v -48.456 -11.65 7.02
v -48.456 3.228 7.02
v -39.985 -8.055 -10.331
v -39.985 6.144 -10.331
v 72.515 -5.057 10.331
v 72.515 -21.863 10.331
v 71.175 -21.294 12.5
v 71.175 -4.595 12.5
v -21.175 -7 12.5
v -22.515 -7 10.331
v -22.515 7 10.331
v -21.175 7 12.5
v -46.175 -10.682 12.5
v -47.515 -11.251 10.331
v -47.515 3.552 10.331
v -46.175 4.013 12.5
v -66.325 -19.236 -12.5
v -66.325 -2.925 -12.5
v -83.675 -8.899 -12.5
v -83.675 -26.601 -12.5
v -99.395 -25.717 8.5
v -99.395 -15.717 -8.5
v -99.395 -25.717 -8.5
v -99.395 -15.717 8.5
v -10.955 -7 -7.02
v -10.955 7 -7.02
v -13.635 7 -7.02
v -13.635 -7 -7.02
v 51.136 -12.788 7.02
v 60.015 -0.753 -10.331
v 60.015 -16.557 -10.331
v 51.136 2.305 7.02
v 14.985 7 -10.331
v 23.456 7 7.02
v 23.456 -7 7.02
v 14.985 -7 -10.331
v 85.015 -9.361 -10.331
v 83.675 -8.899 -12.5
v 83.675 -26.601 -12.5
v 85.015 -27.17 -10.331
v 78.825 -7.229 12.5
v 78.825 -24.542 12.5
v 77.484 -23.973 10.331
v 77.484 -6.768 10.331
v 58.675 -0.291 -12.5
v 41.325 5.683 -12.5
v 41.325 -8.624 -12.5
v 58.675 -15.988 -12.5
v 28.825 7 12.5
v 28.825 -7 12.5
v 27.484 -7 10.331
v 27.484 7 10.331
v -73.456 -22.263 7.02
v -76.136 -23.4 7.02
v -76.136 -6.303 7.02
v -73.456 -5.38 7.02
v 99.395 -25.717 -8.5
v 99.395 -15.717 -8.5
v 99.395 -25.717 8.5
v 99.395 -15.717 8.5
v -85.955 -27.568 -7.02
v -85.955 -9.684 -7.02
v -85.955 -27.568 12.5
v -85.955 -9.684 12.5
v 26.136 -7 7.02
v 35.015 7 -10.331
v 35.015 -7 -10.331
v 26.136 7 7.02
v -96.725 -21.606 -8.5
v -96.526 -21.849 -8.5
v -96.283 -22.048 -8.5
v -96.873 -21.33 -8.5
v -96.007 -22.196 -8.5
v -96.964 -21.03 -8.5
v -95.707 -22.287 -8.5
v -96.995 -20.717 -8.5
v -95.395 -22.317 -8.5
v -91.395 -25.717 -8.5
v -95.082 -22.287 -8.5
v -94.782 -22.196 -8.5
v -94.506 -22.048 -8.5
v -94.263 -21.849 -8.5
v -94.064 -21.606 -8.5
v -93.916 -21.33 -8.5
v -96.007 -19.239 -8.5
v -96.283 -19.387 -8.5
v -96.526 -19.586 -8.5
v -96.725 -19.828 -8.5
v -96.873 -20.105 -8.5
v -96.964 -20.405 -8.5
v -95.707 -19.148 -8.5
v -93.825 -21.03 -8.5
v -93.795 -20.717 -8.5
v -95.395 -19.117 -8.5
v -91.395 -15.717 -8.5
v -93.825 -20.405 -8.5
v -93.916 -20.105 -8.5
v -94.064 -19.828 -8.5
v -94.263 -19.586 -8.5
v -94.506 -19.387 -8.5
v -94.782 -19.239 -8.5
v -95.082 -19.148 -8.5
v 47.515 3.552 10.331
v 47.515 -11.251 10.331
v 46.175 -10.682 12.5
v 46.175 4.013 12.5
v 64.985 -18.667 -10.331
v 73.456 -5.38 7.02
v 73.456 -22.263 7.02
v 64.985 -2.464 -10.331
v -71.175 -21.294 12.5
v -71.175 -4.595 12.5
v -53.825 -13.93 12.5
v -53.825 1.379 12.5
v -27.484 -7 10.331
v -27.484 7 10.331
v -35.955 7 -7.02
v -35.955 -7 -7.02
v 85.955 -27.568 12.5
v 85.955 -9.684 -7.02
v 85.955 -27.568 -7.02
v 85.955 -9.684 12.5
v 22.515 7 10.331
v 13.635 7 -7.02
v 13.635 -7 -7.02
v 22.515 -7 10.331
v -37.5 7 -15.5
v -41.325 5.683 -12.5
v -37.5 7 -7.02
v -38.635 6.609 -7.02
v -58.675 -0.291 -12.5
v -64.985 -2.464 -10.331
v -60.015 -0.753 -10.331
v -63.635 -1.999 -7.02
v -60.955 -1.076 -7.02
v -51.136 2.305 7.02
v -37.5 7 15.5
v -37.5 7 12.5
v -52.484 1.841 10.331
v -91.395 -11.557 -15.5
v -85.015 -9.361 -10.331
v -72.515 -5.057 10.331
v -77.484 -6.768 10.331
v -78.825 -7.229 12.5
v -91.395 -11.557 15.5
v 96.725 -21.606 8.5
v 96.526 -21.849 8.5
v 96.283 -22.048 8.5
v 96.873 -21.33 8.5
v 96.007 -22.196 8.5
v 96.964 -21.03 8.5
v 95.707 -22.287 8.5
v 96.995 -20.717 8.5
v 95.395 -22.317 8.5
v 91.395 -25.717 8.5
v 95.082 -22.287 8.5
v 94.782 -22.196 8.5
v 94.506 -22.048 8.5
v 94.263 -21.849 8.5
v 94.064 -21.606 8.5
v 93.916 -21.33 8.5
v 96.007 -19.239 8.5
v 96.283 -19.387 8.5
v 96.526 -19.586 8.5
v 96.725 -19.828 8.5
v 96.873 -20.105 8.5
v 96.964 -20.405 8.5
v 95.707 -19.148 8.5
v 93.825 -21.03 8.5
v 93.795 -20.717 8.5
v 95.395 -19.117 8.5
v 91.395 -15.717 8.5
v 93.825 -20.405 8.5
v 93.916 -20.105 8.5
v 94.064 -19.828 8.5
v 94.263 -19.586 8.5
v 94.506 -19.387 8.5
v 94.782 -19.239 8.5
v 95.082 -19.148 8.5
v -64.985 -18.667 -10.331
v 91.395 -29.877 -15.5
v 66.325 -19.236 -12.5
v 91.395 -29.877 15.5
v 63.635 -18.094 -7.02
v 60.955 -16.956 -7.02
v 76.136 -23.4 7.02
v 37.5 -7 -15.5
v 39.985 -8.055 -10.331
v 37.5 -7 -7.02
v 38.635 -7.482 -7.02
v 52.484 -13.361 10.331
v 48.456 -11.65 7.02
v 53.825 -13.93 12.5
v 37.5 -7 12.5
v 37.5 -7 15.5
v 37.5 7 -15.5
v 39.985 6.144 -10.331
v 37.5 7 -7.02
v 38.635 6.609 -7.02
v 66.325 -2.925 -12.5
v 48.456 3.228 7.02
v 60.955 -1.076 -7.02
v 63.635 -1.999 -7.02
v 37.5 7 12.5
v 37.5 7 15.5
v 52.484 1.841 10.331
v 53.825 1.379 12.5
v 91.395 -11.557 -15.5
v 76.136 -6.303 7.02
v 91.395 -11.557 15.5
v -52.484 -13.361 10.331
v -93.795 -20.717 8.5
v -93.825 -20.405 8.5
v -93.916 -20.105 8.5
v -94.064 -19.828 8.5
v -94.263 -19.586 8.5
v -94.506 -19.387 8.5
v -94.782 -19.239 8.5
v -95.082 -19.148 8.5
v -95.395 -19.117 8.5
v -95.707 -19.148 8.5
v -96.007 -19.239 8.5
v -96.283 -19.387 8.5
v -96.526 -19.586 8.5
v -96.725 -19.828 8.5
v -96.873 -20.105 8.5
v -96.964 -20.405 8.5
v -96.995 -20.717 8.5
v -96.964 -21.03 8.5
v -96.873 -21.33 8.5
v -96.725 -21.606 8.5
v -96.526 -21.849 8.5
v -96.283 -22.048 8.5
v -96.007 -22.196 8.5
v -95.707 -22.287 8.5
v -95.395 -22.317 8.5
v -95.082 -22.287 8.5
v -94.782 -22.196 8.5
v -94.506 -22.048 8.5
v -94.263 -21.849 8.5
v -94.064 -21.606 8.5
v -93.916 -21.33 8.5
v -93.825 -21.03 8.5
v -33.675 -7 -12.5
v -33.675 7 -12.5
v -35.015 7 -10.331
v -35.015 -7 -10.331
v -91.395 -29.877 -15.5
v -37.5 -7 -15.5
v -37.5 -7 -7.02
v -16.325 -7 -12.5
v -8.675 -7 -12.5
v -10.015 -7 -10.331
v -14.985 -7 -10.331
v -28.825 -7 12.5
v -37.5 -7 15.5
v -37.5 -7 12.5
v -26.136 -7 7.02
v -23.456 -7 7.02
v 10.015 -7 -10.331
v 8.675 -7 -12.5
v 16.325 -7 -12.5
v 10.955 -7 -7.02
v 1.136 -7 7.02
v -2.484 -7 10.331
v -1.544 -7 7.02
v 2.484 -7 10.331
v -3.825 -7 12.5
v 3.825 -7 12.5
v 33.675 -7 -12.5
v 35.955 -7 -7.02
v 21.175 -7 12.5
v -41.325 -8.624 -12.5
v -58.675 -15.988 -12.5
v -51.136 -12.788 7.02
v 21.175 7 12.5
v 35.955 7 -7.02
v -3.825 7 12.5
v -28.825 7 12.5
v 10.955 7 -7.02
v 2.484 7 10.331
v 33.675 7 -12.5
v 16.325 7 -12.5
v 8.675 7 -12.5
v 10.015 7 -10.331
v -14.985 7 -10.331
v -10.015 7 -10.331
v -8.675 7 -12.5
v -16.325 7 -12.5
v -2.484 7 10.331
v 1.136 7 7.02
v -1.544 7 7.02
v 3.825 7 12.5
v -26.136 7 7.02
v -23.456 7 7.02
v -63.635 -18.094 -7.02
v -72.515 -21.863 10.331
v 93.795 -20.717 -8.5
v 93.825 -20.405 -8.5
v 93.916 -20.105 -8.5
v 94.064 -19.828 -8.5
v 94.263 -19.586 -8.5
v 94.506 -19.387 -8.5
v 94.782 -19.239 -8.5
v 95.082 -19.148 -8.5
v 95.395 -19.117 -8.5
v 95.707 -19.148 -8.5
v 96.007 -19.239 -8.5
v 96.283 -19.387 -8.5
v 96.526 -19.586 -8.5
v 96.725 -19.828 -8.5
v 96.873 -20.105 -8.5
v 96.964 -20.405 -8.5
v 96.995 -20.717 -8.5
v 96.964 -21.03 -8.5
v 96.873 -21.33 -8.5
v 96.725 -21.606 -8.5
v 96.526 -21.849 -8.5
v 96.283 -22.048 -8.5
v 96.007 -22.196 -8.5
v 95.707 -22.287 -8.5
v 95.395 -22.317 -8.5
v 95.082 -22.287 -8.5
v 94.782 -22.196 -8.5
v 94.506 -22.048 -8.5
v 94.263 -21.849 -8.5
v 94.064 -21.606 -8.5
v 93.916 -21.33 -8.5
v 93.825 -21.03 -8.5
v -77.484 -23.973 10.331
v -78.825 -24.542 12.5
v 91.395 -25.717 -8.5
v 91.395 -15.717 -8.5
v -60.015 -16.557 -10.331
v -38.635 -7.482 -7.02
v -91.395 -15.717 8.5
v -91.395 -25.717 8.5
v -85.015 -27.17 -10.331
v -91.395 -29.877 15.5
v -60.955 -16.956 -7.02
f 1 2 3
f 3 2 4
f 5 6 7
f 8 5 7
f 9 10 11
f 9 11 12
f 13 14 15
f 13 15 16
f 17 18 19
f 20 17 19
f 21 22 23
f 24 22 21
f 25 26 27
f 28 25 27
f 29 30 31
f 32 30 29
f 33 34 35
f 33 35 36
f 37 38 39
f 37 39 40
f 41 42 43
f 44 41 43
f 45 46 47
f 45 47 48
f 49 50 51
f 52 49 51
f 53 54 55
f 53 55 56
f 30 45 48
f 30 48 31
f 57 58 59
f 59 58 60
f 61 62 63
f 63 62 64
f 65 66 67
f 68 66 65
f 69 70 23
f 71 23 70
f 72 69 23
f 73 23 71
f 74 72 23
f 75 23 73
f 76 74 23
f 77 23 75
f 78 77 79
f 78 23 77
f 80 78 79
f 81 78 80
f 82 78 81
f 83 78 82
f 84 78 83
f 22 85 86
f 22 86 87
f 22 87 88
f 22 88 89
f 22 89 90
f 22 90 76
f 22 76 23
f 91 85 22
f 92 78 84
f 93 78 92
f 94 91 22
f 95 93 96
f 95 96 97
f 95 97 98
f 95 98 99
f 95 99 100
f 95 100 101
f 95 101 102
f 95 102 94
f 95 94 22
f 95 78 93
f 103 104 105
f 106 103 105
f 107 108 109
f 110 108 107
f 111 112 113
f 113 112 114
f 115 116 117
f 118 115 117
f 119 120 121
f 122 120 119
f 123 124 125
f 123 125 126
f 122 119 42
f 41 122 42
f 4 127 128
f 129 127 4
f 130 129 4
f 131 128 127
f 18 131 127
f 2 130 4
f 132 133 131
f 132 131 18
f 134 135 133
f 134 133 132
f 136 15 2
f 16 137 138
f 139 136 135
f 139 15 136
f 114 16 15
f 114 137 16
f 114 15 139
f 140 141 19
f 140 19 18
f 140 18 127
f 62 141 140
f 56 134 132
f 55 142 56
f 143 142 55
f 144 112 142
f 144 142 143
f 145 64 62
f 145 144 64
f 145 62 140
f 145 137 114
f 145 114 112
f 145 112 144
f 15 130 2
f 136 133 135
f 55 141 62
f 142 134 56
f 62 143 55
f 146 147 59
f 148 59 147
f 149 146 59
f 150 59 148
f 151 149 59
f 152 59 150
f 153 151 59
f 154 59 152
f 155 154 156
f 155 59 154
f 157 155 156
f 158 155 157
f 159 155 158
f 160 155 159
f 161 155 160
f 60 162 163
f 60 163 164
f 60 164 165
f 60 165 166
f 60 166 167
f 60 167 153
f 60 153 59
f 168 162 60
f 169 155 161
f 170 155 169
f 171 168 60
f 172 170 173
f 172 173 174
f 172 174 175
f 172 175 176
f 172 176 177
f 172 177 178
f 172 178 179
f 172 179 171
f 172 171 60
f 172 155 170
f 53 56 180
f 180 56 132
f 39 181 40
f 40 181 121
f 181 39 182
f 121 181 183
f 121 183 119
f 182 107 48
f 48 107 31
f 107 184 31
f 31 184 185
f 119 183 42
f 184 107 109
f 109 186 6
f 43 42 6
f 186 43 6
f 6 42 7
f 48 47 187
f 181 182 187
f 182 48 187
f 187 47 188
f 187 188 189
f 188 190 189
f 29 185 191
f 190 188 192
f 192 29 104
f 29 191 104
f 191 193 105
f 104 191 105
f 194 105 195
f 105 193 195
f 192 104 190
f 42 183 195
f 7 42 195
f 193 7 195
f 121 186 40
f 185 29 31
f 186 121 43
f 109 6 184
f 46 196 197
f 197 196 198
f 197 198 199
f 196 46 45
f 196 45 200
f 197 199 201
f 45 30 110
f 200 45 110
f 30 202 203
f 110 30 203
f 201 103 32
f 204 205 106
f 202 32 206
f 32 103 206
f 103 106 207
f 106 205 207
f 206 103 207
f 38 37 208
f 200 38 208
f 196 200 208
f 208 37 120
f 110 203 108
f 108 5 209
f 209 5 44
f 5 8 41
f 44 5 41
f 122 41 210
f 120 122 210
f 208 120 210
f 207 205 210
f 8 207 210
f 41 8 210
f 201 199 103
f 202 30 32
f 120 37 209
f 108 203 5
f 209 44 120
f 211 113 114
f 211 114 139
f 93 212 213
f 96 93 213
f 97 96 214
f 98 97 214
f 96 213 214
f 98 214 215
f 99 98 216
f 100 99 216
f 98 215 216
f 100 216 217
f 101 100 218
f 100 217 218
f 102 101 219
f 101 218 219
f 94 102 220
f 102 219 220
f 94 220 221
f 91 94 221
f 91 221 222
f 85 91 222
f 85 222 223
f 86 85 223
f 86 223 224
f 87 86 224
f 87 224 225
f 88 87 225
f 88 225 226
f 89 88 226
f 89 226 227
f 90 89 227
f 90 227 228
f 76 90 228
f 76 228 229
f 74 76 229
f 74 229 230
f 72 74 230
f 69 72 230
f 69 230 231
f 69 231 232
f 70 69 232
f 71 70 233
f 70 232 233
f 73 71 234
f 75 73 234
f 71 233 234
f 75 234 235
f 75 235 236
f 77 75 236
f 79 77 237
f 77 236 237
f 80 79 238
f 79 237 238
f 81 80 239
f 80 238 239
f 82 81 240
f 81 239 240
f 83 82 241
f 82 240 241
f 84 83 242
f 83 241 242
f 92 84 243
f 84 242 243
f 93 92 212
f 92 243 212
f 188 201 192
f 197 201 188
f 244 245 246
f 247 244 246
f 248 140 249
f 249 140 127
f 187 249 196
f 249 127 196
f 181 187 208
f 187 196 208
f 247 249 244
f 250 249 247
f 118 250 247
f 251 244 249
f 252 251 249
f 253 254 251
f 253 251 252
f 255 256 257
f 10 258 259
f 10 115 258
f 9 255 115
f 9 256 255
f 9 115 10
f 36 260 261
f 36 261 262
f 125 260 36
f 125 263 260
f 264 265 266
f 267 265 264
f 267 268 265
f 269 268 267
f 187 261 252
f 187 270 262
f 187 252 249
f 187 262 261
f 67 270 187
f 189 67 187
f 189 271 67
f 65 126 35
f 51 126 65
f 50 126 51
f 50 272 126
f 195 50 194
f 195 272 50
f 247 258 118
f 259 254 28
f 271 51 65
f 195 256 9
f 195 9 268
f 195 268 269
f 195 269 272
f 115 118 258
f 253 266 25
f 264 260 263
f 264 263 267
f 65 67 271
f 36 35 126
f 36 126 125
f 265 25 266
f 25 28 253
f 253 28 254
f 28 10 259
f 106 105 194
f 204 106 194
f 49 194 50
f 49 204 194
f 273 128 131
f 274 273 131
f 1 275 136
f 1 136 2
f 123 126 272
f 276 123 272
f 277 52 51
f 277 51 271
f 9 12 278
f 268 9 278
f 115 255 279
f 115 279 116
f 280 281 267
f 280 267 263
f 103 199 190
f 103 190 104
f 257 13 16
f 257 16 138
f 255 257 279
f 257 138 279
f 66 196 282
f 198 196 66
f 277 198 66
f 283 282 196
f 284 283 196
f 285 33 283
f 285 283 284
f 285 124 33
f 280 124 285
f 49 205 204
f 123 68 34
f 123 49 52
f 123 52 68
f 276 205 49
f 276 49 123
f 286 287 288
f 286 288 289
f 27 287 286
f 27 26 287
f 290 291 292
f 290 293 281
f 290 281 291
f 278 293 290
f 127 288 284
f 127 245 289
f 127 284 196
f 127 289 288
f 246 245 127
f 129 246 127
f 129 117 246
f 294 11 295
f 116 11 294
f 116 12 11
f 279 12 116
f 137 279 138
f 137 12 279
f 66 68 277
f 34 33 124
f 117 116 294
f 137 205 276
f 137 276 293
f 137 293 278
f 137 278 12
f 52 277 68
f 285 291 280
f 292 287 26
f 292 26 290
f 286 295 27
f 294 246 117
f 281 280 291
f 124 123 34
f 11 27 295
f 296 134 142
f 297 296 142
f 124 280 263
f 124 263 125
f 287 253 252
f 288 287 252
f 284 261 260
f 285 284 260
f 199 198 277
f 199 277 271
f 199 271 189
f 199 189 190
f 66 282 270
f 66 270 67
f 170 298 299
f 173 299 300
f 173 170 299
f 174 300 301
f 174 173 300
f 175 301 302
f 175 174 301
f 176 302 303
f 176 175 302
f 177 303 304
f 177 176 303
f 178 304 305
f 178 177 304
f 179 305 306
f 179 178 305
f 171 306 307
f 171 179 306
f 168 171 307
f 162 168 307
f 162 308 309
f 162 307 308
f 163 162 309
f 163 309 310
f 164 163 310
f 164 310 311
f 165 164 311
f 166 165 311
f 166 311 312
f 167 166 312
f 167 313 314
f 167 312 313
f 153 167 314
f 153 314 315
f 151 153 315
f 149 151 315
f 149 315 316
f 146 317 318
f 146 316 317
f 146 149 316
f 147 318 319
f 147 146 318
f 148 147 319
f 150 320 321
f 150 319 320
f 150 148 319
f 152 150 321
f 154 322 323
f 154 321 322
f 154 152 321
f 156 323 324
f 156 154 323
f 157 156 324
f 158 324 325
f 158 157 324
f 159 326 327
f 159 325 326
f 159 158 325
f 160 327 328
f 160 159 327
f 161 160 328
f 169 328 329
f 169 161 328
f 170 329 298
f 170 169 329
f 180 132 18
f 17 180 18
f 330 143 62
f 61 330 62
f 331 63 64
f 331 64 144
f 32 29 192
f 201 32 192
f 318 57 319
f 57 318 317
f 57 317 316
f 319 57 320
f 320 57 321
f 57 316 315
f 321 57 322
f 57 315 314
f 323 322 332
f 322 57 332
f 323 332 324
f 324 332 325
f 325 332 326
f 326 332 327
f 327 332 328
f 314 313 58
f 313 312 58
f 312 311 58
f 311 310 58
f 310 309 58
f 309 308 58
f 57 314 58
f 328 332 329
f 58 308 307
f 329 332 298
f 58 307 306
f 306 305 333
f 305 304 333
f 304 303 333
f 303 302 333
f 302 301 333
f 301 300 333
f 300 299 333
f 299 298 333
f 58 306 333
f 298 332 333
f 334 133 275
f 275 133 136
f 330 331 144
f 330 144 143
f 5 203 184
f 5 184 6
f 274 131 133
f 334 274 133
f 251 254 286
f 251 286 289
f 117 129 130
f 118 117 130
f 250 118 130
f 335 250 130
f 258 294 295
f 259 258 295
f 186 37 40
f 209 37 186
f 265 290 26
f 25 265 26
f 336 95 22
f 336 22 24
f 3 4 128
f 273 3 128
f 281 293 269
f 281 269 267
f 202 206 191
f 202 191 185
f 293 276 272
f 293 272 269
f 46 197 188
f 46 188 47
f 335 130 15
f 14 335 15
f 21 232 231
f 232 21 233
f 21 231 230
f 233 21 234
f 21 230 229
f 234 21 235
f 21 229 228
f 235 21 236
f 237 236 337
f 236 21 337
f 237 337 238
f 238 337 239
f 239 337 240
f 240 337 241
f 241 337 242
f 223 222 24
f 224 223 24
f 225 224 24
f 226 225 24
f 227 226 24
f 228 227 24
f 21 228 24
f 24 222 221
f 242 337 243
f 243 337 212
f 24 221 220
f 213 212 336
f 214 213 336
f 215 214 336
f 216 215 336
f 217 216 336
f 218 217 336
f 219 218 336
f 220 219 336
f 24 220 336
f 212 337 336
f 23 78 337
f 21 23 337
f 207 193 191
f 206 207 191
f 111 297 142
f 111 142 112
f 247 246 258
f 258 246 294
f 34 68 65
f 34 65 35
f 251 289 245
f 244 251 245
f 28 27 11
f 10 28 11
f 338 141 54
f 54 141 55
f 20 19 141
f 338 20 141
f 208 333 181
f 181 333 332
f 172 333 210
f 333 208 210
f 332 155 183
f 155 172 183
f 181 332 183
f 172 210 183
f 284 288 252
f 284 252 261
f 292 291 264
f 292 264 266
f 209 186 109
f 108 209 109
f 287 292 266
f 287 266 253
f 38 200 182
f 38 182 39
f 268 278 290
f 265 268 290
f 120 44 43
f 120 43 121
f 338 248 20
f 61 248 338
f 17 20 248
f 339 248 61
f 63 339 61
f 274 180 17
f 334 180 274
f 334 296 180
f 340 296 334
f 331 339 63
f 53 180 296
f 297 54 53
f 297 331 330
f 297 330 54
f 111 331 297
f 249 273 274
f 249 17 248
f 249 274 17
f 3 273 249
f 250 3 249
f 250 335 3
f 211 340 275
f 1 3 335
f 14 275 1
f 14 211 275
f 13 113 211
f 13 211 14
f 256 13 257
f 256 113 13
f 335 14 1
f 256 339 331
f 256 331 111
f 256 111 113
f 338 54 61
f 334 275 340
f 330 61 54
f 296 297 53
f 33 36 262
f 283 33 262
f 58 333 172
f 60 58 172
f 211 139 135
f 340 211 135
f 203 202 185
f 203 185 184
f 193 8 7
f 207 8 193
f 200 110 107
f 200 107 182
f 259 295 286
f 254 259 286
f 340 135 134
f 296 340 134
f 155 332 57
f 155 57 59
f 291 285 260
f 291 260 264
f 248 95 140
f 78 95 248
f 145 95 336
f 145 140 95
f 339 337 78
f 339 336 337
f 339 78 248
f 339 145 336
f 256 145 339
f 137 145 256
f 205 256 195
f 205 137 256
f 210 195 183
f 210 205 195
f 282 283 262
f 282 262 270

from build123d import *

# Parameters (mm, degrees)
CROQUIS1_W              = 37.5
CROQUIS1_H              = 14
SALIENTE_EXTRUIR1_DEPTH = 15.5
CROQUIS2_W              = 17
CROQUIS2_H              = 10
SALIENTE_EXTRUIR2_DEPTH = 8
CROQUIS3_R              = 1.6
CORTAR_EXTRUIR1_DEPTH   = 107.526693573
CORTAR_EXTRUIR2_DEPTH   = 108.142287781


with BuildPart() as part:
    # Croquis1 → Saliente-Extruir1 (new, symmetric)
    with BuildSketch(Plane.XY):
        Polygon((-91.394558809, -11.557384804), (-91.394558809, -29.877384804), (-37.5, -7), (-37.5, 7), align=None)
        Polygon((37.5, 7), (91.394558809, -11.557384804), (91.394558809, -29.877384804), (37.5, -7), align=None)
        with Locations((18.75, 0)):
            Rectangle(CROQUIS1_W, CROQUIS1_H)
        with Locations((-18.75, 0)):
            Rectangle(CROQUIS1_W, CROQUIS1_H)
    extrude(amount=SALIENTE_EXTRUIR1_DEPTH, both=True)

    # Croquis2 → Saliente-Extruir2 (add)
    with BuildSketch(Plane.ZY.offset(91.394558809)):
        with Locations((0, -20.717384804)):
            Rectangle(CROQUIS2_W, CROQUIS2_H)
    saliente_extruir2 = extrude(amount=SALIENTE_EXTRUIR2_DEPTH)

    # Croquis3 → Cortar-Extruir1 (cut, through all)
    with BuildSketch(Plane.XY.offset(8.5)):
        with Locations((-95.394558809, -20.717384804)):
            Circle(CROQUIS3_R)
    cortar_extruir1 = extrude(amount=-CORTAR_EXTRUIR1_DEPTH, mode=Mode.SUBTRACT)

    # Simetría1: Saliente-Extruir2, Cortar-Extruir1 across plane
    add(saliente_extruir2.mirror(Plane(origin=(0, 0, 0), x_dir=(0, 0, 1), z_dir=(1, 0, 0))))
    add(cortar_extruir1.mirror(Plane(origin=(0, 0, 0), x_dir=(0, 0, 1), z_dir=(1, 0, 0))), mode=Mode.SUBTRACT)

    # Croquis4 → Cortar-Extruir2 (cut, through all)
    with BuildSketch(Plane(origin=(0, 7, 0), x_dir=(1, 0, 0), z_dir=(0, 1, 0))):
        Polygon((-8.675, 12.5), (8.675, 12.5), (10.015331351, 10.33066557), (1.135565493, -7.02), (-1.544434507, -7.02), (-10.015331351, 10.33066557), align=None)
        Polygon((3.8246, -12.5), (2.484268649, -10.33066557), (10.955165493, 7.02), (13.635165493, 7.02), (22.514931351, -10.33066557), (21.1746, -12.5), align=None)
        Polygon((35.015331351, 10.33066557), (26.135565493, -7.02), (23.455565493, -7.02), (14.984668649, 10.33066557), (16.325, 12.5), (33.675, 12.5), align=None)
        Polygon((28.8246, -12.5), (27.484268649, -10.33066557), (35.955165493, 7.02), (38.635165493, 7.02), (47.514931351, -10.33066557), (46.1746, -12.5), align=None)
        Polygon((60.015331351, 10.33066557), (51.135565493, -7.02), (48.455565493, -7.02), (39.984668649, 10.33066557), (41.325, 12.5), (58.675, 12.5), align=None)
        Polygon((53.8246, -12.5), (52.484268649, -10.33066557), (60.955165493, 7.02), (63.635165493, 7.02), (72.514931351, -10.33066557), (71.1746, -12.5), align=None)
        Polygon((85.015331351, 10.33066557), (76.135565493, -7.02), (73.455565493, -7.02), (64.984668649, 10.33066557), (66.325, 12.5), (83.675, 12.5), align=None)
        Polygon((78.8246, -12.5), (77.484268649, -10.33066557), (85.955165493, 7.02), (85.955165493, -12.5), align=None)
        Polygon((-3.8246, -12.5), (-2.484268649, -10.33066557), (-10.955165493, 7.02), (-13.635165493, 7.02), (-22.514931351, -10.33066557), (-21.1746, -12.5), align=None)
        Polygon((-83.675, 12.5), (-85.015331351, 10.33066557), (-76.135565493, -7.02), (-73.455565493, -7.02), (-64.984668649, 10.33066557), (-66.325, 12.5), align=None)
        Polygon((-60.955165493, 7.02), (-63.635165493, 7.02), (-72.514931351, -10.33066557), (-71.1746, -12.5), (-53.8246, -12.5), (-52.484268649, -10.33066557), align=None)
        Polygon((-58.675, 12.5), (-60.015331351, 10.33066557), (-51.135565493, -7.02), (-48.455565493, -7.02), (-39.984668649, 10.33066557), (-41.325, 12.5), align=None)
        Polygon((-35.955165493, 7.02), (-38.635165493, 7.02), (-47.514931351, -10.33066557), (-46.1746, -12.5), (-28.8246, -12.5), (-27.484268649, -10.33066557), align=None)
        Polygon((-33.675, 12.5), (-35.015331351, 10.33066557), (-26.135565493, -7.02), (-23.455565493, -7.02), (-14.984668649, 10.33066557), (-16.325, 12.5), align=None)
        Polygon((-85.955165493, 7.02), (-85.955165493, -12.5), (-78.8246, -12.5), (-77.484268649, -10.33066557), align=None)
    extrude(amount=-CORTAR_EXTRUIR2_DEPTH, mode=Mode.SUBTRACT)


solid = part.part
